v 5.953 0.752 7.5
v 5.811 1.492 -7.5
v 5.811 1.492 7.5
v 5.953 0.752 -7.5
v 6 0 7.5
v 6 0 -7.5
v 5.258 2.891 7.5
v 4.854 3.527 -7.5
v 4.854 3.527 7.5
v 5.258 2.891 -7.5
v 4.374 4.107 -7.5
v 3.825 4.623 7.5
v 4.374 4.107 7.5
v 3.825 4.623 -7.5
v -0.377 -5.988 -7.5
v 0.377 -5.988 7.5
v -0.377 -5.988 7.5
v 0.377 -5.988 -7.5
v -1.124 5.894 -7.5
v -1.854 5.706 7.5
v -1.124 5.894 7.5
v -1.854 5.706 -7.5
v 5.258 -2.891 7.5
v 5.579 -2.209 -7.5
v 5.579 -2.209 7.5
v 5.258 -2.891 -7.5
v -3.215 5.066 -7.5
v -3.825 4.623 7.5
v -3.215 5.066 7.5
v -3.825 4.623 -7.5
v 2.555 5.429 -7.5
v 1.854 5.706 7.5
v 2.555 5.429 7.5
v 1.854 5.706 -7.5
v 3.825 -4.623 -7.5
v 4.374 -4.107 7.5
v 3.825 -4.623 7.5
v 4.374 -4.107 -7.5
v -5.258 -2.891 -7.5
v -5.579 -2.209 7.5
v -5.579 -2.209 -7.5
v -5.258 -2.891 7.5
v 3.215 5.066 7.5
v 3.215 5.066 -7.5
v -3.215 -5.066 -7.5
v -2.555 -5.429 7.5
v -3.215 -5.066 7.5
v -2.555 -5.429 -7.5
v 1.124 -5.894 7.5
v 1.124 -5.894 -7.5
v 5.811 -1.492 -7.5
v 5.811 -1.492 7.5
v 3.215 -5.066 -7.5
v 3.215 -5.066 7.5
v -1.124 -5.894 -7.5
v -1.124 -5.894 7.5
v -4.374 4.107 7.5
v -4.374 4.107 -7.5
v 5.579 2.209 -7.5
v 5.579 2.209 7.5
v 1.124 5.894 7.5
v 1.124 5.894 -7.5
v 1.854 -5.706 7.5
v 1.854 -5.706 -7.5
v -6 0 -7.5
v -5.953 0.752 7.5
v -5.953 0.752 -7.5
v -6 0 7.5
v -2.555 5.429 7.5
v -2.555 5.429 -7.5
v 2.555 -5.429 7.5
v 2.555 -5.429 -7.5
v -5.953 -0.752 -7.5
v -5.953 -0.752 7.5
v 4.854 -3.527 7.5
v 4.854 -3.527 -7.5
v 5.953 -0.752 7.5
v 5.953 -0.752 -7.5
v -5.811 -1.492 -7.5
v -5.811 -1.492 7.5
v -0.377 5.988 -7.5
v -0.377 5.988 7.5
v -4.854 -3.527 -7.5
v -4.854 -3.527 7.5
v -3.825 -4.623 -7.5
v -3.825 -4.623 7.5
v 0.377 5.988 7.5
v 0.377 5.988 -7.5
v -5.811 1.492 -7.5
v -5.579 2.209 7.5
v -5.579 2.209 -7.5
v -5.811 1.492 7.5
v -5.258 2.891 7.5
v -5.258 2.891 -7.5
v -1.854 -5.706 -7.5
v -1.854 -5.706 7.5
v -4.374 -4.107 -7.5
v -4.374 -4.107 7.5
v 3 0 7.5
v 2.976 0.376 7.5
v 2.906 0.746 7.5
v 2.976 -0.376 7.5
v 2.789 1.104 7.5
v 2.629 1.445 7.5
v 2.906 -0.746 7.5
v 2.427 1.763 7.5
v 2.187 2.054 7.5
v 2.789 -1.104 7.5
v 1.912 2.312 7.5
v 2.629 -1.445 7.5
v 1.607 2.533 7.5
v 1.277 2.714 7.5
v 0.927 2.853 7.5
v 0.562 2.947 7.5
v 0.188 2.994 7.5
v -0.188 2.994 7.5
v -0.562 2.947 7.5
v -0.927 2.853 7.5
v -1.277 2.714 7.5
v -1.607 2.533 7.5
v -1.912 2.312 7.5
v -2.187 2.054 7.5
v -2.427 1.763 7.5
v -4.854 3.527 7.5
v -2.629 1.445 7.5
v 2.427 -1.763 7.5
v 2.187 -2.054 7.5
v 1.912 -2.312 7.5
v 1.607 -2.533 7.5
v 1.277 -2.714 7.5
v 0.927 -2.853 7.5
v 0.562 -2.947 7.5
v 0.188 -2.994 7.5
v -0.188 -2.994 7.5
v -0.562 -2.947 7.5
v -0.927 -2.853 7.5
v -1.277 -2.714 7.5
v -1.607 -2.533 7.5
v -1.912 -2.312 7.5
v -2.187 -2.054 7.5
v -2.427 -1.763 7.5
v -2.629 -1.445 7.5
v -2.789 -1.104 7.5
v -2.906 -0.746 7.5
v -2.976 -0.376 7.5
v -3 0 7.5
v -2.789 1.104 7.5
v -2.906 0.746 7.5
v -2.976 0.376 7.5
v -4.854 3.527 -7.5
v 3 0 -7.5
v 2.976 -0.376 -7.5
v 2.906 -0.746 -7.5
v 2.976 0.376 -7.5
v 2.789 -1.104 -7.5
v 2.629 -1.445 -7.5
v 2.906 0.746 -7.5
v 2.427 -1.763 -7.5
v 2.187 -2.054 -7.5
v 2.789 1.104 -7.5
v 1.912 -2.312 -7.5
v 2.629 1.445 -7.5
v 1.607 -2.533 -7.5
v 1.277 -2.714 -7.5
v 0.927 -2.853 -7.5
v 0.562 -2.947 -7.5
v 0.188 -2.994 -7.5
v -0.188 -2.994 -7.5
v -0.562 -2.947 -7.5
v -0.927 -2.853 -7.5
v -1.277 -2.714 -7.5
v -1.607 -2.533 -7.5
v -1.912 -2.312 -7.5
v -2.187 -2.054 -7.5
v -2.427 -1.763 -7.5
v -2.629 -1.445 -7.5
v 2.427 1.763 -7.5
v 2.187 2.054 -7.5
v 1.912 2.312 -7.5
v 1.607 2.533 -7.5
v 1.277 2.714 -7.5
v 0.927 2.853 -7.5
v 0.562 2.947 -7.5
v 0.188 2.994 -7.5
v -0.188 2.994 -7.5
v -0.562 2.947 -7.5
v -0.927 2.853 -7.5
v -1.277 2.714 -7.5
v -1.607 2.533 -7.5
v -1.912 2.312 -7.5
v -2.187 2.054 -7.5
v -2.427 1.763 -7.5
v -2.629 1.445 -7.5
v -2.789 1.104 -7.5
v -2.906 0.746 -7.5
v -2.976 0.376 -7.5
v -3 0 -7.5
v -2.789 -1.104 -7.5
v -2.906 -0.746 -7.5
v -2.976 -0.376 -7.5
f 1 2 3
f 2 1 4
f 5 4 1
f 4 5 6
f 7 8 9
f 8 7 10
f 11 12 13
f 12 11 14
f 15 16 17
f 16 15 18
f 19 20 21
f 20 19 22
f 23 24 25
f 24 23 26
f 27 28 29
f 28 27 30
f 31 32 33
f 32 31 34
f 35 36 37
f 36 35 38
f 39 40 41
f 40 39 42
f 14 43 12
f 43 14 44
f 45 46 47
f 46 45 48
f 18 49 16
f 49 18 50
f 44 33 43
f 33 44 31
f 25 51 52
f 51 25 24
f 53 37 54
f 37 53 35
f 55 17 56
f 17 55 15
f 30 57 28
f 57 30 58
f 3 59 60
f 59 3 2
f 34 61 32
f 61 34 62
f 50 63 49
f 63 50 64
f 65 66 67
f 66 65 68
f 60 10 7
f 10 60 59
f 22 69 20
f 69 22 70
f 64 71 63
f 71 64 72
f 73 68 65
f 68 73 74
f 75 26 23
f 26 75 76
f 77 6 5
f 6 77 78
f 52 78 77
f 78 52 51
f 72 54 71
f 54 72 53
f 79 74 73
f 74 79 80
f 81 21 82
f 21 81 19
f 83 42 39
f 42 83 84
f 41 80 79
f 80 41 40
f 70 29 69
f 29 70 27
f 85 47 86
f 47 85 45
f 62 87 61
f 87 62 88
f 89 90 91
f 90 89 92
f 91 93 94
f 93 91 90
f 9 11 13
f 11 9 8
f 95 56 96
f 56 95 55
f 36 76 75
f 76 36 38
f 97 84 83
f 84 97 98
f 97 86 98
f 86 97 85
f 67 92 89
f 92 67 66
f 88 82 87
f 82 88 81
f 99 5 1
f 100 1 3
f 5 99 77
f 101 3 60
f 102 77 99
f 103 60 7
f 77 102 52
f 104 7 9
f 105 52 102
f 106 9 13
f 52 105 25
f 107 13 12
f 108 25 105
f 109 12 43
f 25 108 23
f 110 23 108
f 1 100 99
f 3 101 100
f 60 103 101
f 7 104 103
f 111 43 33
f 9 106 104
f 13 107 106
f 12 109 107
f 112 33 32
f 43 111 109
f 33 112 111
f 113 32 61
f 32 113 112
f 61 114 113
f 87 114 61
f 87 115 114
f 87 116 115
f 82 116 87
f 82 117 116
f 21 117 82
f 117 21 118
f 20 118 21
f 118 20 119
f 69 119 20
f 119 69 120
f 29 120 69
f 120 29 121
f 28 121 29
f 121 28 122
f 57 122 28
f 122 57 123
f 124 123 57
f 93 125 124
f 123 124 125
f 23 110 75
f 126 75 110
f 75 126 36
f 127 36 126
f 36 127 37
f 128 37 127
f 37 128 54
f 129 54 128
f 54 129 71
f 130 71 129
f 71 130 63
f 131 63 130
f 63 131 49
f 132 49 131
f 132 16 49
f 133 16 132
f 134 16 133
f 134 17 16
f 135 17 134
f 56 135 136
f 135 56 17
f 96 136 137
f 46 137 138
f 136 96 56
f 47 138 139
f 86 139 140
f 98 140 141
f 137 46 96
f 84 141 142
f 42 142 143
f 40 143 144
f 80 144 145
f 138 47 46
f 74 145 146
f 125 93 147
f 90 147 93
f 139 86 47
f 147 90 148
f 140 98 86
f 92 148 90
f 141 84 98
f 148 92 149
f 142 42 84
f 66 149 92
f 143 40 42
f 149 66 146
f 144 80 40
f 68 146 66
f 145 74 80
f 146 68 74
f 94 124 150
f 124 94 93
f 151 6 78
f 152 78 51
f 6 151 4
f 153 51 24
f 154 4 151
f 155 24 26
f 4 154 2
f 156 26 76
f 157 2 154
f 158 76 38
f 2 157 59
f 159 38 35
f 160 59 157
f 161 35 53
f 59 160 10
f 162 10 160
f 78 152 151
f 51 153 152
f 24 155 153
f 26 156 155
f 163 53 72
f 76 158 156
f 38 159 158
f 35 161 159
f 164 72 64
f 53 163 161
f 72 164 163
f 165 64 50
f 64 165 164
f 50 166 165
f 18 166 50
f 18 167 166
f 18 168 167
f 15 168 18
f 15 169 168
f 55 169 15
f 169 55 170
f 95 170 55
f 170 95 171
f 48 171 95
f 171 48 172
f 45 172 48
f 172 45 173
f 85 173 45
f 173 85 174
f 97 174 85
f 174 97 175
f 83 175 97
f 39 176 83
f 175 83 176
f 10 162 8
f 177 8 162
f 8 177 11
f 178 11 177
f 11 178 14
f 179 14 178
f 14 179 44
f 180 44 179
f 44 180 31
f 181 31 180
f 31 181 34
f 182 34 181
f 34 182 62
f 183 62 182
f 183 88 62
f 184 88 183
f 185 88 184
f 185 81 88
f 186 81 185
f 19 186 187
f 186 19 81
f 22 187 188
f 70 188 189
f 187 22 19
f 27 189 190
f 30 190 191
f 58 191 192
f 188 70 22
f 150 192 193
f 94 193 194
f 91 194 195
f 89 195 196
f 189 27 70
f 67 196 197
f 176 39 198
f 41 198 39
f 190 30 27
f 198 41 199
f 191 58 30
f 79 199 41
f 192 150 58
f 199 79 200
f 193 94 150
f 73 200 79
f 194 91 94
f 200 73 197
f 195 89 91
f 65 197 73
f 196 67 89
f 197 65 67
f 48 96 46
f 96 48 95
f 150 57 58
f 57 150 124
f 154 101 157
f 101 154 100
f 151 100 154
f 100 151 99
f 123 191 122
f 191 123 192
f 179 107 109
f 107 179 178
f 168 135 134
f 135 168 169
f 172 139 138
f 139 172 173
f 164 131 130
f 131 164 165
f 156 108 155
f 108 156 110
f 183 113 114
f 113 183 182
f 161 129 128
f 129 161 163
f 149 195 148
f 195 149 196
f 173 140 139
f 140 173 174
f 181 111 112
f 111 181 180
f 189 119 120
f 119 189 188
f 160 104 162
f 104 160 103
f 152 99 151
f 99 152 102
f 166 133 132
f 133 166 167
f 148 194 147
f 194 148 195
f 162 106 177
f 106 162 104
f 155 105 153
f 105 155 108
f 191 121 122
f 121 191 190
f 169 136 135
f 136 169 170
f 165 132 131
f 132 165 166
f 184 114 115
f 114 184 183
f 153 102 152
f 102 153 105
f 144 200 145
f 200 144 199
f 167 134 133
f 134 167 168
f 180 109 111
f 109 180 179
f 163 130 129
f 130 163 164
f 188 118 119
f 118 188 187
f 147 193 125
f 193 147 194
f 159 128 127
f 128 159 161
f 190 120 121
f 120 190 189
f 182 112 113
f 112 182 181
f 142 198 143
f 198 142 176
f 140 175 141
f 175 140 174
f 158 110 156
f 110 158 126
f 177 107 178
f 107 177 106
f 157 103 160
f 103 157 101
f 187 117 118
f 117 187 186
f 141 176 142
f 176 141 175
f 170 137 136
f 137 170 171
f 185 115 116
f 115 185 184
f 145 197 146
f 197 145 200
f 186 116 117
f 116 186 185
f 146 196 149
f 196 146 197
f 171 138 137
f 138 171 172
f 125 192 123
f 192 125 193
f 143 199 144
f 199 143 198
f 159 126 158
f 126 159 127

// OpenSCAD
$fn = 50;


difference() {
	union() {
		translate(v = [0, 0, -7.5000000000]) {
			cylinder(h = 15, r = 6.0000000000);
		}
	}
	union() {
		translate(v = [0, 0, -100.0000000000]) {
			cylinder(h = 200, r = 3.0000000000);
		}
	}
}
